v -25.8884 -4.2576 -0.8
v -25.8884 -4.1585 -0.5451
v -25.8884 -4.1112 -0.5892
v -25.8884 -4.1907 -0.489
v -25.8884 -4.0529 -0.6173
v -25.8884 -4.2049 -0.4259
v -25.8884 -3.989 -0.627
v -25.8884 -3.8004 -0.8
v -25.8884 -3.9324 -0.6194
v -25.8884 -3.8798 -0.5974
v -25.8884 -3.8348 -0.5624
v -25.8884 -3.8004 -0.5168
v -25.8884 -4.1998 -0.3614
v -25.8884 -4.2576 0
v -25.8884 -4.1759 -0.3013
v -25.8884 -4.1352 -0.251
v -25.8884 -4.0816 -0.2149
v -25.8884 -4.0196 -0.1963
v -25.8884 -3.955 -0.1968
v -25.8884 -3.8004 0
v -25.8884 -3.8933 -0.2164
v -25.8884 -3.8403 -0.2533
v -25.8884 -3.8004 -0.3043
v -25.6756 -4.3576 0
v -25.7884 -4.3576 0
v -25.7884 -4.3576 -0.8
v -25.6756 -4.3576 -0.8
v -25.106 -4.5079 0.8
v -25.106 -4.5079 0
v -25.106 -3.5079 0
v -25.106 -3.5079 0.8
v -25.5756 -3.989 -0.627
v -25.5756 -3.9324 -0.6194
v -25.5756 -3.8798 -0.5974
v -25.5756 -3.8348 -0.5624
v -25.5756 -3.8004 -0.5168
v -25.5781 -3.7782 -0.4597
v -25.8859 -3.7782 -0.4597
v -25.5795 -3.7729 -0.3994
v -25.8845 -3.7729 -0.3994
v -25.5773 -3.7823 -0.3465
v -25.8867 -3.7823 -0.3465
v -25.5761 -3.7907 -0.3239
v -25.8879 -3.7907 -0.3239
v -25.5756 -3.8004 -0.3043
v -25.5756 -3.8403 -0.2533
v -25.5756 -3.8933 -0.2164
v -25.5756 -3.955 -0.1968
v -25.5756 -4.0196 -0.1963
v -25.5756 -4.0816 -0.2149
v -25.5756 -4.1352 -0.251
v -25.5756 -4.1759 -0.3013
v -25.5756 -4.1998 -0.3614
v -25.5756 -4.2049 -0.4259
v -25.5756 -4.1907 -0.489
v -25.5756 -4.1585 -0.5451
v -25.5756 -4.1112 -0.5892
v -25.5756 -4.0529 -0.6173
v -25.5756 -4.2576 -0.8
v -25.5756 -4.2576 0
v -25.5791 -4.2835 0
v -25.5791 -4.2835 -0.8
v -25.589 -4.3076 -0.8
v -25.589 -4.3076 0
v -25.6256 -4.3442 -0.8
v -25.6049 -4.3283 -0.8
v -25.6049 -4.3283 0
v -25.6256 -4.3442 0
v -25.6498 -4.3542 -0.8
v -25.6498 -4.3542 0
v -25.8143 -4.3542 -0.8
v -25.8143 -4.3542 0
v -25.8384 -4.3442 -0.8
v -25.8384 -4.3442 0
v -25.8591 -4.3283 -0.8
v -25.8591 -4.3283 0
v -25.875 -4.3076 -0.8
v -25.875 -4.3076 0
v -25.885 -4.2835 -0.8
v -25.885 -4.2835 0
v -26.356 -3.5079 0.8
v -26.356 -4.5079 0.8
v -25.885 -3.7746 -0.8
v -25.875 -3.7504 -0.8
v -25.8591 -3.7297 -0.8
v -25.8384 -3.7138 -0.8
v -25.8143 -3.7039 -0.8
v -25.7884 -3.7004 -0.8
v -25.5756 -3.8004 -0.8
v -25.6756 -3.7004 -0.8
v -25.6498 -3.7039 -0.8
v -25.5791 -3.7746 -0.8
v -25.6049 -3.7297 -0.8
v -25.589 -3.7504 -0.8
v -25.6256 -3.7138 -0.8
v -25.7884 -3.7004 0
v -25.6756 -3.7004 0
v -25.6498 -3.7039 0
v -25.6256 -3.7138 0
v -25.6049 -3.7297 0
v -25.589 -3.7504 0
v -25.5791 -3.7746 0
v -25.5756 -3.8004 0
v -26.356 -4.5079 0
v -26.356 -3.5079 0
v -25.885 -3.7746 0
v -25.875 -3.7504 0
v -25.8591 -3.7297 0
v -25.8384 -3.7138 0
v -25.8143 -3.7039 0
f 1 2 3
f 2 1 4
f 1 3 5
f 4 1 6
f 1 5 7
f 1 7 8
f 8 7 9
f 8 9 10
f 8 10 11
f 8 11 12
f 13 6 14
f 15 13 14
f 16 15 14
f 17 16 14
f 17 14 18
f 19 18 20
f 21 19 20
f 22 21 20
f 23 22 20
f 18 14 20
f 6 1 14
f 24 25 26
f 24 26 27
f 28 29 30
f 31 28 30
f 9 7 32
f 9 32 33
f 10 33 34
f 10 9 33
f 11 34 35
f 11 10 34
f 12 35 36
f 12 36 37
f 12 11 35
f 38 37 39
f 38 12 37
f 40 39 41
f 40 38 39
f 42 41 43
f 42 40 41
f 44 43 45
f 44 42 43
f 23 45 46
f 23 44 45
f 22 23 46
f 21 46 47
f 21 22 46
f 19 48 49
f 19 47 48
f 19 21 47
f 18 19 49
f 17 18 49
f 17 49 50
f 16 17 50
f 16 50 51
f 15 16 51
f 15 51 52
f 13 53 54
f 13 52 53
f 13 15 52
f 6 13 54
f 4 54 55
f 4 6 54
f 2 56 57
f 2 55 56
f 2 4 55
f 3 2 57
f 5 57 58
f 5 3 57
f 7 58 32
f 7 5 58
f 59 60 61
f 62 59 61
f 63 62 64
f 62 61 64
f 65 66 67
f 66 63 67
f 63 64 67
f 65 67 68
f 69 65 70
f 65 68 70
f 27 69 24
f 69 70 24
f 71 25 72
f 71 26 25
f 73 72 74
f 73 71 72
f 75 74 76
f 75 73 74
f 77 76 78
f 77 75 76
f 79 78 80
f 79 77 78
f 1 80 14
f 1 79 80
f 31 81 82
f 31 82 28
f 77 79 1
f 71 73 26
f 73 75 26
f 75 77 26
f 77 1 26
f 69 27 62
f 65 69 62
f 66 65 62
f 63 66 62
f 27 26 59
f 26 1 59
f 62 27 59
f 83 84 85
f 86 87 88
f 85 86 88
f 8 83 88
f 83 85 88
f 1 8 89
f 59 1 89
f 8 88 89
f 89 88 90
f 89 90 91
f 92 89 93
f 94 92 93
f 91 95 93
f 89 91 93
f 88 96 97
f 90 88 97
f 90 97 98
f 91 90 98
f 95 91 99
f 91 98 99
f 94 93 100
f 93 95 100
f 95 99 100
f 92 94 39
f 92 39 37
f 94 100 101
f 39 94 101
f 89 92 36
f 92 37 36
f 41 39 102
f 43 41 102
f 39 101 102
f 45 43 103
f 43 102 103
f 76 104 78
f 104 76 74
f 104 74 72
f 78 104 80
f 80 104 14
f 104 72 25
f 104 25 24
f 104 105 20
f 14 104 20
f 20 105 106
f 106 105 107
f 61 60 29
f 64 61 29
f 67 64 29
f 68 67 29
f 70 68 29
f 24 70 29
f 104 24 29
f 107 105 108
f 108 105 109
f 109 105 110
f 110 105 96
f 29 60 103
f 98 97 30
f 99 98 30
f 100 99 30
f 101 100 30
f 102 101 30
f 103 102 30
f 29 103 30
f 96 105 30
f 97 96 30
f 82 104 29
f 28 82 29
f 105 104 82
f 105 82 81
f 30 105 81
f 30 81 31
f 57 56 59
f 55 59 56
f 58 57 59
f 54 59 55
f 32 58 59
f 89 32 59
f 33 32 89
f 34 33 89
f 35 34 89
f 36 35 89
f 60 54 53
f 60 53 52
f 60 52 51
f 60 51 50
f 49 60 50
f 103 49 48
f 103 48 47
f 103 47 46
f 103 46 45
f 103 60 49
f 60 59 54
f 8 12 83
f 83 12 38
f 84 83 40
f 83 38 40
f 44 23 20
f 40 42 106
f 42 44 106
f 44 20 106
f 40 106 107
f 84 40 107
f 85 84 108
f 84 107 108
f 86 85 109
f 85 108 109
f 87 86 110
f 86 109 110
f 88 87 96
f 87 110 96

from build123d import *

# Parameters (mm, degrees)
SKETCH1_W               = 1.25
SKETCH1_H               = 1
BOSS_EXTRUDE1_DEPTH     = 0.8
SKETCH2_W               = 0.312740208
SKETCH2_H               = 0.657177059
BOSS_EXTRUDE3_DEPTH     = 0.8
CUT_EXTRUDE1_DEPTH      = 5.644364033
CUT_EXTRUDE1_DEPTH_BACK = 5.644364033
SKETCH3_R               = 0.216417025
FILLET1_R               = 0.1
FILLET2_R               = 0.1
FILLET3_R               = 0.1


with BuildPart() as part:
    # Sketch1 → Boss-Extrude1 (new body)
    with BuildSketch(Plane.XY):
        with Locations((-25.730959564, -4.007907279)):
            Rectangle(SKETCH1_W, SKETCH1_H)
    extrude(amount=BOSS_EXTRUDE1_DEPTH)

    # Sketch2 → Boss-Extrude3 (add)
    with BuildSketch(Plane.XY):
        with Locations((-25.732016119, -4.029038374)):
            Rectangle(SKETCH2_W, SKETCH2_H)
    extrude(amount=-BOSS_EXTRUDE3_DEPTH)

    # Sketch3 → Cut-Extrude1 (cut, two sides: drawn at the far end of the back side and taken through both)
    with BuildSketch(Plane(origin=(-25.575646015, 0, 0), x_dir=(0, 0, -1), z_dir=(1, 0, 0)).offset(-CUT_EXTRUDE1_DEPTH_BACK)):
        with Locations((0.410542062, -3.988999955)):
            Circle(SKETCH3_R)
    extrude(amount=CUT_EXTRUDE1_DEPTH + CUT_EXTRUDE1_DEPTH_BACK, mode=Mode.SUBTRACT)

    # Fillet1
    # the kernel refuses this fillet: 0.1 mm, written as the material it takes off along each edge
    with BuildSketch(Plane(origin=(-25.575646015, -3.700449845, 0), x_dir=(-1, 0, 0), z_dir=(0, 0, -1))) as fillet1_piece_1:
        with BuildLine():
            CenterArc((FILLET1_R, -FILLET1_R), FILLET1_R, 90, 90)
            Line((0, -FILLET1_R), (0, 0))
            Line((0, 0), (FILLET1_R, 0))
        make_face()
    extrude(amount=1.05, mode=Mode.SUBTRACT)

    # Fillet2
    # the kernel refuses this fillet: 0.1 mm, written as the material it takes off along each edge
    with BuildSketch(Plane(origin=(-25.888386223, -3.700449845, 0), x_dir=(1, 0, 0), z_dir=(0, 0, -1))) as fillet2_piece_1:
        with BuildLine():
            CenterArc((FILLET2_R, FILLET2_R), FILLET2_R, 180, 90)
            Line((0, FILLET2_R), (0, 0))
            Line((0, 0), (FILLET2_R, 0))
        make_face()
    extrude(amount=1.05, mode=Mode.SUBTRACT)
    with BuildSketch(Plane(origin=(-25.575646015, -4.357626904, 0), x_dir=(0, 1, 0), z_dir=(0, 0, -1))) as fillet2_piece_2:
        with BuildLine():
            CenterArc((FILLET2_R, -FILLET2_R), FILLET2_R, 90, 90)
            Line((0, -FILLET2_R), (0, 0))
            Line((0, 0), (FILLET2_R, 0))
        make_face()
    extrude(amount=1.05, mode=Mode.SUBTRACT)

    # Fillet3
    fillet3_edges = [part.edges().sort_by_distance(p)[0] for p in [
        (-25.888386223, -4.357626904, -0.4),
    ]]
    fillet(fillet3_edges, radius=FILLET3_R)


solid = part.part
